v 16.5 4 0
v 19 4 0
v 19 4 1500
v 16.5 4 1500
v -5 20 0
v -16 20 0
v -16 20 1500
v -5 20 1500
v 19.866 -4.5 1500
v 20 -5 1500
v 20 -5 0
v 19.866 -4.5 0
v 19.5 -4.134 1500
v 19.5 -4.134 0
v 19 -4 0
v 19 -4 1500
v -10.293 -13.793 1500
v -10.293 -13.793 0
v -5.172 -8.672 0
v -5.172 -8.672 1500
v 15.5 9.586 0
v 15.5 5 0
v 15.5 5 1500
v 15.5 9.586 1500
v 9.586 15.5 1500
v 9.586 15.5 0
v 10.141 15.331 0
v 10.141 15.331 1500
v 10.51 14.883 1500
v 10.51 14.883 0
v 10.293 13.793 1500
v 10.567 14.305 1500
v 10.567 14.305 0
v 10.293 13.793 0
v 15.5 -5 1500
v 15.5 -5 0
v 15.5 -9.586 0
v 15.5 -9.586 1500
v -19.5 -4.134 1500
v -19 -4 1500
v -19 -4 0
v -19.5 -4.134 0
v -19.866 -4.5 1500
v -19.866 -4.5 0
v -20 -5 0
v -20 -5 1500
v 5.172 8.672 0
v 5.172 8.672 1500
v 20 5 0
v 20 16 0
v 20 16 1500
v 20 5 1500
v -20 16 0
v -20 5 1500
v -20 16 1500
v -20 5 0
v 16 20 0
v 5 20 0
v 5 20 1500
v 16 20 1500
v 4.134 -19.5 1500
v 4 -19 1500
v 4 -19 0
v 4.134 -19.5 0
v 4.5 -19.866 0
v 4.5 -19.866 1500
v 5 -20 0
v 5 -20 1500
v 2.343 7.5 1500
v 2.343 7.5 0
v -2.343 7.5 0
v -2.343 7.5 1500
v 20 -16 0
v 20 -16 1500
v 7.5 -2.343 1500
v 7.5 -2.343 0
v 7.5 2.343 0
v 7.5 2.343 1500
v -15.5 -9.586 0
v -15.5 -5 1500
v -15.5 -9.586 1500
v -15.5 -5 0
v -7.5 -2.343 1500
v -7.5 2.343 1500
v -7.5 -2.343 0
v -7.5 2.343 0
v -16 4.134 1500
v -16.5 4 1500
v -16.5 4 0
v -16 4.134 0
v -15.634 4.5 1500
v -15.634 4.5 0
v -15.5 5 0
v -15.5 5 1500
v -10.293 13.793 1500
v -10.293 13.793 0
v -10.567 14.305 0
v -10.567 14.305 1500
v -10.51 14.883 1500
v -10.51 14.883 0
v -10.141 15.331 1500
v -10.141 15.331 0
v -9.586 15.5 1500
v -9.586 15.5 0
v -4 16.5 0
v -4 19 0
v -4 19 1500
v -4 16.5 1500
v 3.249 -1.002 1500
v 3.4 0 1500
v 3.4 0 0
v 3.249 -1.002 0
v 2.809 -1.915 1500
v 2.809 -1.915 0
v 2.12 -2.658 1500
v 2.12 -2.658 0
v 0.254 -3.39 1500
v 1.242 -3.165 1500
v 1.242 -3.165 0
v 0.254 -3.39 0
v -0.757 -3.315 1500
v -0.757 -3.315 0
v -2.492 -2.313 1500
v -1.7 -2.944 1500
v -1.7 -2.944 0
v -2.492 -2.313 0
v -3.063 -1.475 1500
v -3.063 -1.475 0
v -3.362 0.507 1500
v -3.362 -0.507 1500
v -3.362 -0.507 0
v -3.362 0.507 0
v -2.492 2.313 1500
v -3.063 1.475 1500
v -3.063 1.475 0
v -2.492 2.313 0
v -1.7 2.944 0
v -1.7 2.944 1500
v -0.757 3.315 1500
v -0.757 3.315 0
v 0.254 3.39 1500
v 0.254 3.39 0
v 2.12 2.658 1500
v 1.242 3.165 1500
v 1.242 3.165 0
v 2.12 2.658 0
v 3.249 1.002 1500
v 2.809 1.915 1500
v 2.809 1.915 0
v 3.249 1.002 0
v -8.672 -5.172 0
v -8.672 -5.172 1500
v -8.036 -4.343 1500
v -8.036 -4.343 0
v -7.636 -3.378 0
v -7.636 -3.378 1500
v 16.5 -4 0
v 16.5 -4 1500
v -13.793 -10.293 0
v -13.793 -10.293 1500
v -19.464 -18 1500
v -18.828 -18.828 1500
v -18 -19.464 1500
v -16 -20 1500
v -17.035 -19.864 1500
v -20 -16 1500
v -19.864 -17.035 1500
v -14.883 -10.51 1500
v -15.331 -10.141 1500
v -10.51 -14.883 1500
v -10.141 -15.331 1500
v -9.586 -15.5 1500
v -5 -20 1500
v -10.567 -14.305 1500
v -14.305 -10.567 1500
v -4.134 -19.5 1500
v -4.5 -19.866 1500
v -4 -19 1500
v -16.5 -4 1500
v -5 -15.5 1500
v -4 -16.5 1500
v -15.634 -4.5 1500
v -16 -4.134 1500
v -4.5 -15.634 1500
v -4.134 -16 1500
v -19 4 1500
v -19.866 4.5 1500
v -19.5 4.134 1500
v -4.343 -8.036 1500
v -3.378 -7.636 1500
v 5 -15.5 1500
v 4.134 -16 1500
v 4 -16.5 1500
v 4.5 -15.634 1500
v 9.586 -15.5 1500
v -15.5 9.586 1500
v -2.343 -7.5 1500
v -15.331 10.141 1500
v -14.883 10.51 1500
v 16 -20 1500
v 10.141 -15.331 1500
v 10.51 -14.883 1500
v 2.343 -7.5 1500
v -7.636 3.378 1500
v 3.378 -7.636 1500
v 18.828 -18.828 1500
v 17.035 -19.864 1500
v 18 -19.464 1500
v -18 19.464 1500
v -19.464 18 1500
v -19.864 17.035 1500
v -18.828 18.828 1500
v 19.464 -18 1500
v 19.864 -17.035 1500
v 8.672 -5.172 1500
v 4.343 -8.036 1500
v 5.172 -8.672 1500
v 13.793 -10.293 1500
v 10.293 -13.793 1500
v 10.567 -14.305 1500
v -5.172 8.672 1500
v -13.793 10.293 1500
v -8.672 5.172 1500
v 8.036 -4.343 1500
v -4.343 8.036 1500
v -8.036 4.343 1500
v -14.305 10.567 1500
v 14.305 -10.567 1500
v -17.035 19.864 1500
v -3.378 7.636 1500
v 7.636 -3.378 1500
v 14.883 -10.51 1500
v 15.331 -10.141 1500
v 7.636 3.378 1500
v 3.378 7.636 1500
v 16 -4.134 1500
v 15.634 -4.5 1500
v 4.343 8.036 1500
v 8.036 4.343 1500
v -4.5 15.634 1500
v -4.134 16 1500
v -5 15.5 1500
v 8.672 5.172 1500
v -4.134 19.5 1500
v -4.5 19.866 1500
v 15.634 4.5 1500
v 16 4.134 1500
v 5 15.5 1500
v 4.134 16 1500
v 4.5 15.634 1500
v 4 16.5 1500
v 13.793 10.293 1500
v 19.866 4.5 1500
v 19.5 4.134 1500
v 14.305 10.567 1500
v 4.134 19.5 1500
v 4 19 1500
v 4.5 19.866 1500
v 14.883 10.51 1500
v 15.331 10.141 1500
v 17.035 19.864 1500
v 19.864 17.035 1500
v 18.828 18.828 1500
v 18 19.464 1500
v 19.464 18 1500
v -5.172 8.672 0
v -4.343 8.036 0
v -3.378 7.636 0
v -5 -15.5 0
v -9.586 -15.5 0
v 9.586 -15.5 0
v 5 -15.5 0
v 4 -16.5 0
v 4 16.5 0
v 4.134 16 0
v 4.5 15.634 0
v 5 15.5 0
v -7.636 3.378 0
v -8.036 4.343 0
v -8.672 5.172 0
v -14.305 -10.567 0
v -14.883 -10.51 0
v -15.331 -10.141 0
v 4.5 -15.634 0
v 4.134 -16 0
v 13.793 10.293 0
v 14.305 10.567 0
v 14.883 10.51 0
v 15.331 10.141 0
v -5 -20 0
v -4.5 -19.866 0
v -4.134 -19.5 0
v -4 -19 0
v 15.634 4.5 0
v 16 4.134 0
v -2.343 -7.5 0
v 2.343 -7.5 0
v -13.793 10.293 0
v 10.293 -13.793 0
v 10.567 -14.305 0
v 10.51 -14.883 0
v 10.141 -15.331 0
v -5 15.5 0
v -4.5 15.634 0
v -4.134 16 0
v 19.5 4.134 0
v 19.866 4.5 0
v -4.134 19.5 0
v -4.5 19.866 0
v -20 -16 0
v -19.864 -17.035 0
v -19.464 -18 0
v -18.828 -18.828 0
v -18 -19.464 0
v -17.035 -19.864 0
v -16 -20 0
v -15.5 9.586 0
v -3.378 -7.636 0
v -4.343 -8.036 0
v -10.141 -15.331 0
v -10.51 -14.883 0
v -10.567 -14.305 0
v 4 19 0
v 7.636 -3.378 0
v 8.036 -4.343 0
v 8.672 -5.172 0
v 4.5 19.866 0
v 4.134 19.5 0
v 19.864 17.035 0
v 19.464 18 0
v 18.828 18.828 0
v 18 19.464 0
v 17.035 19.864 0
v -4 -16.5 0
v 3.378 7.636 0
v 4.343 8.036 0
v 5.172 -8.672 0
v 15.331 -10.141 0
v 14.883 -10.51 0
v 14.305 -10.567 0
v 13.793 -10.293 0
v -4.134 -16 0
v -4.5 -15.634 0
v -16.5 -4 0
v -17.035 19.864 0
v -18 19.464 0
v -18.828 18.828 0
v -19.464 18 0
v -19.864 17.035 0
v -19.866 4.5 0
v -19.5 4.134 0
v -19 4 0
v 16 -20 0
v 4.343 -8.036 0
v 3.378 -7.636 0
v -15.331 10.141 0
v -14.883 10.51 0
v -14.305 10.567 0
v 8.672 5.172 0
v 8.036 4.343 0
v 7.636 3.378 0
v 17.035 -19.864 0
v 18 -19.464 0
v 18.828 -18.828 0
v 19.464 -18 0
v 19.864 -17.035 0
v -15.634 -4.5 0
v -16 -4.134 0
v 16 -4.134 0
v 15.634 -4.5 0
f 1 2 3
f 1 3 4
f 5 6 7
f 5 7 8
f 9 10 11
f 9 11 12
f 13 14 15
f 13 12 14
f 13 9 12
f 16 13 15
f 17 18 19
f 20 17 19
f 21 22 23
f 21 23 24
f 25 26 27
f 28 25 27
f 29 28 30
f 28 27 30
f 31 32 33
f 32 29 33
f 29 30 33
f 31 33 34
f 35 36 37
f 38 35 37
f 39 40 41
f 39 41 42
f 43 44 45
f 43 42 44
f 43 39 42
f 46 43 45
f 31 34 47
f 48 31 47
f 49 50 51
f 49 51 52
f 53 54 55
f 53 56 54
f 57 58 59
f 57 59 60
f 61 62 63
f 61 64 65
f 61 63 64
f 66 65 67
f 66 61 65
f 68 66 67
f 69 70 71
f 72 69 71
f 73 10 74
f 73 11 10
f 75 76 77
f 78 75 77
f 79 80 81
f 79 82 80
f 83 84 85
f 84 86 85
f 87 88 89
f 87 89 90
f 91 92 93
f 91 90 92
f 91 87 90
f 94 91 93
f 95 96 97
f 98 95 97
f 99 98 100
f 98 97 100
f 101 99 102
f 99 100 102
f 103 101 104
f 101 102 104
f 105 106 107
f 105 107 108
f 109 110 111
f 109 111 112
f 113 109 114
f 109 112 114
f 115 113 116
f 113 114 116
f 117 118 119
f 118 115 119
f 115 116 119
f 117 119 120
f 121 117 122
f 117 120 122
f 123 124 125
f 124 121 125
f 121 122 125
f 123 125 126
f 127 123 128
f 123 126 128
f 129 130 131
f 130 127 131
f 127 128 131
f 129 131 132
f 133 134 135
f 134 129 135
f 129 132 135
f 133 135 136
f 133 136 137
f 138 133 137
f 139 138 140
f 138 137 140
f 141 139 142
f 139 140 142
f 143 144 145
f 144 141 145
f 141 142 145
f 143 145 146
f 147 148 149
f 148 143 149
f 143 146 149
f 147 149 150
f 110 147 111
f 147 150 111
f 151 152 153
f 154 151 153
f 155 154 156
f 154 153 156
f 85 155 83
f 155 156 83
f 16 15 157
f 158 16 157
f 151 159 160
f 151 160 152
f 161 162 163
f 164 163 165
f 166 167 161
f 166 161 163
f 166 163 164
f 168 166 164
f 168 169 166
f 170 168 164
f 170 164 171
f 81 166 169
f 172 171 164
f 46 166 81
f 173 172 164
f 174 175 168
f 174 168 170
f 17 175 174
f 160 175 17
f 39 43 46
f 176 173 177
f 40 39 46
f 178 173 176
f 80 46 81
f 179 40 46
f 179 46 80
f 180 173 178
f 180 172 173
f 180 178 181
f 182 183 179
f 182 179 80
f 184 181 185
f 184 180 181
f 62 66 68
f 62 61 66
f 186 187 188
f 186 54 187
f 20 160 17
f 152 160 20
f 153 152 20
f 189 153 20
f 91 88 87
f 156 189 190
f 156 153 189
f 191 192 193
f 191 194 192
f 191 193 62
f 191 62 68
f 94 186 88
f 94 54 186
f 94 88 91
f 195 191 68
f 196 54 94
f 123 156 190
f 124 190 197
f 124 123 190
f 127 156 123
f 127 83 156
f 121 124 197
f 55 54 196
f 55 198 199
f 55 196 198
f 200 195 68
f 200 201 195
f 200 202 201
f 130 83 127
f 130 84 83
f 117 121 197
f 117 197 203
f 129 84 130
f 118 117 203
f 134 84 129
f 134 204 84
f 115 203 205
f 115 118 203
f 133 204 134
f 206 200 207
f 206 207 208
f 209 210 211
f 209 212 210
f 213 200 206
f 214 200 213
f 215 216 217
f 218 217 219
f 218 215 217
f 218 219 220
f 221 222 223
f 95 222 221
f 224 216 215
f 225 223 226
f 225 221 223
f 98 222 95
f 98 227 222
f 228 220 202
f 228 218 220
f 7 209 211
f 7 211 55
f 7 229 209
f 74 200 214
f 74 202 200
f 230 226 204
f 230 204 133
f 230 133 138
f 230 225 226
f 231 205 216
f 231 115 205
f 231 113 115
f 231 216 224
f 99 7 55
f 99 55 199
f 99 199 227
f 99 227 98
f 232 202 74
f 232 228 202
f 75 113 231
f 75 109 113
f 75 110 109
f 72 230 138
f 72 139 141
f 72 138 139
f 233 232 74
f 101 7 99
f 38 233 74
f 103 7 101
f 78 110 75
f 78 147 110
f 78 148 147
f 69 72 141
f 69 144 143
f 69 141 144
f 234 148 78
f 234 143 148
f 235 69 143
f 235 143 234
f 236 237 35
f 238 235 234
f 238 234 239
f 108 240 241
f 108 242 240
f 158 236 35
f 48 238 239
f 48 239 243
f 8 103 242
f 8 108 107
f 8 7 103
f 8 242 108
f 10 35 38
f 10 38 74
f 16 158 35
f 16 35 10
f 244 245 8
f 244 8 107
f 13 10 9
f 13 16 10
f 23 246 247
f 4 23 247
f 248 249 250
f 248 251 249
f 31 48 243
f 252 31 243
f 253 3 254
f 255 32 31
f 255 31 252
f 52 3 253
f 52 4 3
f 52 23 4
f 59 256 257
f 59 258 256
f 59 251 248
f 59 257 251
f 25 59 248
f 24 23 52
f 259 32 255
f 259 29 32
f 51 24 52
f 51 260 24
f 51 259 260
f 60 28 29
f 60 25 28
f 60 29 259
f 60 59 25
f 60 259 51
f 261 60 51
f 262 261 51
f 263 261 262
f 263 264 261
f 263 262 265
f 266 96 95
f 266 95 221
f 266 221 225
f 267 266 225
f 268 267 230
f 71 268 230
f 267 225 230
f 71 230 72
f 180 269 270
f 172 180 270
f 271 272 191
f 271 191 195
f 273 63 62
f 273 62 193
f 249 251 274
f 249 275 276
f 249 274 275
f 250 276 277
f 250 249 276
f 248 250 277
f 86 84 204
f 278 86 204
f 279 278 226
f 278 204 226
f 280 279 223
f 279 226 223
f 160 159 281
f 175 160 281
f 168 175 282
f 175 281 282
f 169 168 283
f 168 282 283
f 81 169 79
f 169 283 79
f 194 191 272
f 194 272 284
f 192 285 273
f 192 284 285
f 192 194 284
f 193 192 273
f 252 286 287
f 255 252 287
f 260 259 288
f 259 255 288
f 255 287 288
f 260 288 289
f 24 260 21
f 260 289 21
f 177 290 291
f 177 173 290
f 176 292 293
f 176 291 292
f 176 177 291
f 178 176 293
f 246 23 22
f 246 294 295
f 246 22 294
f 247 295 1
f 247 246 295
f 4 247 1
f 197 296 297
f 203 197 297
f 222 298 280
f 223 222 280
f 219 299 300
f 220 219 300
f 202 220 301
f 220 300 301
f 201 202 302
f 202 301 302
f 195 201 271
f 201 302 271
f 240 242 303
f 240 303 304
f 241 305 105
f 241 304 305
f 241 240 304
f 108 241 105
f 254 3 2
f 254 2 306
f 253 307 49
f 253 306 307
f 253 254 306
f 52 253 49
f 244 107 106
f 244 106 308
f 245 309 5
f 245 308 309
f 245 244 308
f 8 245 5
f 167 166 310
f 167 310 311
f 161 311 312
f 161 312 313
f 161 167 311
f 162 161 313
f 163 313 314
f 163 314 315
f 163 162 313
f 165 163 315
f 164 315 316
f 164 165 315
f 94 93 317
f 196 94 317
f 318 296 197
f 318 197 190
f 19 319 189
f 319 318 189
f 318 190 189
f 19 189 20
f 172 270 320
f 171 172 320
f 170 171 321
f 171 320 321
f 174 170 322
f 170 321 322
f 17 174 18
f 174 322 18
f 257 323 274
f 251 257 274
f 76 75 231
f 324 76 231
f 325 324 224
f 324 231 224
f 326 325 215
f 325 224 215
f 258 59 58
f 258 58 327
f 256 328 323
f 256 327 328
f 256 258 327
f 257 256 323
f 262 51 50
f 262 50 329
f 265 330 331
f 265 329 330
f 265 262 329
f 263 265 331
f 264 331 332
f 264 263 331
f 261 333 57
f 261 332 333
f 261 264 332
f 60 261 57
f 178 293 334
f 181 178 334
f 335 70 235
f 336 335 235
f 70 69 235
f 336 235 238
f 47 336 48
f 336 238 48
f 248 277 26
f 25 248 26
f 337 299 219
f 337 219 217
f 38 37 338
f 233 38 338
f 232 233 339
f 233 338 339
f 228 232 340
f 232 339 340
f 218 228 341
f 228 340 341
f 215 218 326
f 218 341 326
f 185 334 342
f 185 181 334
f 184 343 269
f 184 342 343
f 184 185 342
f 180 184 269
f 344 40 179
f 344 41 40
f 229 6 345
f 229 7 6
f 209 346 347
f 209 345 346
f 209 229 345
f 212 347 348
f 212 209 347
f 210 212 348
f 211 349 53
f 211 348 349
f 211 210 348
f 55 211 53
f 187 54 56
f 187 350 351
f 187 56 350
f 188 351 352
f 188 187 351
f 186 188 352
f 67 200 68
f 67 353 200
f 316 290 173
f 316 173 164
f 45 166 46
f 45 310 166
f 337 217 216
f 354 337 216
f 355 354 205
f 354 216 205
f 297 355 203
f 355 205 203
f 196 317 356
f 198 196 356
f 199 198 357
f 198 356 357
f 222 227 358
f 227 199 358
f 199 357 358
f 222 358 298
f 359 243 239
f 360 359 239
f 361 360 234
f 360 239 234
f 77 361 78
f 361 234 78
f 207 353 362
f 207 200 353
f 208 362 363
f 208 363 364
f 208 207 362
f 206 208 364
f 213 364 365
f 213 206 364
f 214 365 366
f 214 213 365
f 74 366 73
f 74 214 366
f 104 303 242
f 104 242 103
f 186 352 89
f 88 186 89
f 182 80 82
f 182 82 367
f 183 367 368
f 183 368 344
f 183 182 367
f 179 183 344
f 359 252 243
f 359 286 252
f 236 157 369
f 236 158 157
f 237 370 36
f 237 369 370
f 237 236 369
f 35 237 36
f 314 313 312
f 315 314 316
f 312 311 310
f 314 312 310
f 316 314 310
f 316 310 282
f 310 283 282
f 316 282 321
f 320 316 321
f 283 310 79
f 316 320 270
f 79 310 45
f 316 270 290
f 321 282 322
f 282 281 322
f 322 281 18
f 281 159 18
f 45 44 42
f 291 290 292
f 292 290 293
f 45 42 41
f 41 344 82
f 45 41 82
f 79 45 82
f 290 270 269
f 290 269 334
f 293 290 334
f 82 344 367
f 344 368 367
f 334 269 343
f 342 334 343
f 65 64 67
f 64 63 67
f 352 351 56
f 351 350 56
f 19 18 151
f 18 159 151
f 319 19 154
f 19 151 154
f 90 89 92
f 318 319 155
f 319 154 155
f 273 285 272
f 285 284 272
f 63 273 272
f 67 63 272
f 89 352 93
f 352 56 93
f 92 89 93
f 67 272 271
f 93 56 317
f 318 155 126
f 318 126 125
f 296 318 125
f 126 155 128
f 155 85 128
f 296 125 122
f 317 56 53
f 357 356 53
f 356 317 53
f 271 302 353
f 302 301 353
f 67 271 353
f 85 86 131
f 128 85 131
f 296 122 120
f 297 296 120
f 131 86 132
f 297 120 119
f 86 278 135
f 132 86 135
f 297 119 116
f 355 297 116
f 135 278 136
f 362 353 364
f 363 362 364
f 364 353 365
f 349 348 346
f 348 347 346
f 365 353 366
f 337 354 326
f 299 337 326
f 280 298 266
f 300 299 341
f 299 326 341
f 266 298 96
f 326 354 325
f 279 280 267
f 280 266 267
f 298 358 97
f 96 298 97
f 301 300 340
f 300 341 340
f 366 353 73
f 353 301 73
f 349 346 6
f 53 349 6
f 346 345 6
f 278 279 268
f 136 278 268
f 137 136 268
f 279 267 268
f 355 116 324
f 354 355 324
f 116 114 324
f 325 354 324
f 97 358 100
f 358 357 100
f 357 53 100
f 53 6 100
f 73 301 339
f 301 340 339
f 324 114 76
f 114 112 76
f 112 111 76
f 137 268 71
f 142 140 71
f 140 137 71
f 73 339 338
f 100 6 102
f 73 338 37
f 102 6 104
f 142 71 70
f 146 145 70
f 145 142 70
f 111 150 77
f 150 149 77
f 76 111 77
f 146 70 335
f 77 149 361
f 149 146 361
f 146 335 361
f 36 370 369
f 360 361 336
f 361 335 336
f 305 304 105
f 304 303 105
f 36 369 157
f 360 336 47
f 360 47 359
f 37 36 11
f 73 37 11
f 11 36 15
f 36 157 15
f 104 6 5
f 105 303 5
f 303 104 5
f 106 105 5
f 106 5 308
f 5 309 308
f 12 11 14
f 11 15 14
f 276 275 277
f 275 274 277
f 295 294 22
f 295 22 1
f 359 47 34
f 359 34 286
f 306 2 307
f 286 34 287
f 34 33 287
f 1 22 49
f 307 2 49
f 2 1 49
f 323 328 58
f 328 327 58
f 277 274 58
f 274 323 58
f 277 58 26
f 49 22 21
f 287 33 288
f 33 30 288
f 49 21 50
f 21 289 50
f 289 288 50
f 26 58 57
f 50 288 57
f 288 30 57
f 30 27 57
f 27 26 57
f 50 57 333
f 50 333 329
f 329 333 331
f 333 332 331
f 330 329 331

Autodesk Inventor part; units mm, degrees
ref_plane "YZ Plane" through (0, 0, 0) normal (1, 0, 0) x (0, 1, 0)
ref_plane "XZ Plane" through (0, 0, 0) normal (0, 1, 0) x (-1, 0, 0)
ref_plane "XY Plane" through (0, 0, 0) normal (0, 0, 1) x (1, 0, 0)
sketch "T-Slot 4040 Base" plane through (0, 0, 0) normal (0, 0, 1) x (1, 0, 0)
  line L0 (-28, 0) -> (28, 0) construction
  line L1 (0, -28) -> (0, 28) construction
  circle A0 centre (0, 0) radius 3.4
  line L2 (-7.5, -7.5) -> (7.5, -7.5)
  line L3 (7.5, -7.5) -> (7.5, 7.5)
  line L4 (7.5, 7.5) -> (-7.5, 7.5)
  line L5 (-7.5, 7.5) -> (-7.5, -7.5)
  line L6 (-7.5, -7.5) -> (7.5, 7.5) construction
  line L7 (7.5, -7.5) -> (-7.5, 7.5) construction
  line L8 (20, 4) -> (15.5, 4)
  line L9 (15.5, 4) -> (15.5, 12)
  line L10 (15.5, 12) -> (7.5, 4)
  line L11 (4, 20) -> (4, 15.5)
  line L12 (4, 15.5) -> (12, 15.5)
  line L13 (12, 15.5) -> (4, 7.5)
  line L14 (7.5, -7.5) -> (-7.5, -7.5)
  arc A1 (15.5, 9.5858) -> (13.7929, 10.2929) centre (14.5, 9.5858) ccw
  arc A2 (10.2929, 13.7929) -> (9.5858, 15.5) centre (9.5858, 14.5) ccw
  line L15 (-20, 20) -> (20, 20)
  line L16 (20, 20) -> (20, -20)
  line L17 (20, -20) -> (-20, -20)
  line L18 (-20, -20) -> (-20, 20)
  line L19 (-20, 20) -> (20, -20) construction
  line L20 (20, 20) -> (-20, -20) construction
  line L21 (-4, 15.5) -> (-12, 15.5)
  arc A3 (-9.5858, 15.5) -> (-10.2929, 13.7929) centre (-9.5858, 14.5) ccw
  line L22 (-12, 15.5) -> (-4, 7.5)
  line L23 (-15.5, 12) -> (-7.5, 4)
  line L24 (-20, 4) -> (-15.5, 4)
  arc A4 (-13.7929, 10.2929) -> (-15.5, 9.5858) centre (-14.5, 9.5858) ccw
  line L25 (-15.5, 4) -> (-15.5, 12)
  line L26 (-4, 20) -> (-4, 15.5)
  line L27 (-15.5, -4) -> (-15.5, -12)
  arc A5 (-15.5, -9.5858) -> (-13.7929, -10.2929) centre (-14.5, -9.5858) ccw
  line L28 (-15.5, -12) -> (-7.5, -4)
  line L29 (-12, -15.5) -> (-4, -7.5)
  line L30 (-4, -20) -> (-4, -15.5)
  arc A6 (-10.2929, -13.7929) -> (-9.5858, -15.5) centre (-9.5858, -14.5) ccw
  line L31 (-4, -15.5) -> (-12, -15.5)
  line L32 (-20, -4) -> (-15.5, -4)
  line L33 (4, -15.5) -> (12, -15.5)
  arc A7 (9.5858, -15.5) -> (10.2929, -13.7929) centre (9.5858, -14.5) ccw
  line L34 (12, -15.5) -> (4, -7.5)
  line L35 (15.5, -12) -> (7.5, -4)
  line L36 (20, -4) -> (15.5, -4)
  arc A8 (13.7929, -10.2929) -> (15.5, -9.5858) centre (14.5, -9.5858) ccw
  line L37 (15.5, -4) -> (15.5, -12)
  line L38 (4, -20) -> (4, -15.5)
  point P0 (4.9274, 7.75)
  point P1 (9.5858, 15.5)
  point P2 (-20, 20)
  point P3 (-7.5, -7.5)
  point P4 (-20, -20)
  point P5 (7.5, -7.5)
  point P6 (20, -20)
  point P7 (-9.5858, -15.5)
  point P8 (-4, -7.5)
  point P9 (15.5, -9.5858)
  point P10 (7.5, -4)
  point P11 (-15.5, 9.5858)
  point P12 (-4, 7.5)
  dimension "d35" = 6.8
  dimension "d37" = 12
  dimension "d38" = 1
  dimension "d43" = 40
  dimension "d44" = 40
  dimension "d45" = 4.5
  dimension "d46" = 4
  dimension "d53" = 360
extrude "Extrusion1" add sketch "T-Slot 4040 Base" along normal blind 1500 contours L5 L4 L3 L2 | L2 L29 L31 L30 L17 L18 L32 L27 L28 L5 | L2 L3 L35 L37 L36 L16 L17 L38 L33 L34 | A6 L31 L29 | L23 L25 L24 L18 L15 L26 L21 L22 L4 L5 | L28 L27 A5 | L34 L33 A7 | A4 L25 L23 | L3 L4 L13 L12 L11 L15 L16 L8 L9 L10 | A8 L37 L35 | L22 L21 A3 | L10 L9 A1 | A2 L12 L13
fillet "Rundung1" radius 1 16 edges at (4, 15.5, 750) (15.5, 4, 750) (20, 4, 750) (4, 20, 750) (-20, 4, 750) (-15.5, 4, 750) (-4, 15.5, 750) (-4, 20, 750) (-4, -15.5, 750) (-4, -20, 750) (4, -15.5, 750) (4, -20, 750) (15.5, -4, 750) (20, -4, 750) (-20, -4, 750) (-15.5, -4, 750)
fillet "Rundung2" radius 4 12 edges at (4, 7.5, 750) (7.5, 4, 750) (-20, 20, 750) (-20, -20, 750) (20, 20, 750) (20, -20, 750) (7.5, -4, 750) (-7.5, -4, 750) (-7.5, 4, 750) (4, -7.5, 750) (-4, -7.5, 750) (-4, 7.5, 750)
properties part number "T-SLOT 4040 B-Type 1500mm"
